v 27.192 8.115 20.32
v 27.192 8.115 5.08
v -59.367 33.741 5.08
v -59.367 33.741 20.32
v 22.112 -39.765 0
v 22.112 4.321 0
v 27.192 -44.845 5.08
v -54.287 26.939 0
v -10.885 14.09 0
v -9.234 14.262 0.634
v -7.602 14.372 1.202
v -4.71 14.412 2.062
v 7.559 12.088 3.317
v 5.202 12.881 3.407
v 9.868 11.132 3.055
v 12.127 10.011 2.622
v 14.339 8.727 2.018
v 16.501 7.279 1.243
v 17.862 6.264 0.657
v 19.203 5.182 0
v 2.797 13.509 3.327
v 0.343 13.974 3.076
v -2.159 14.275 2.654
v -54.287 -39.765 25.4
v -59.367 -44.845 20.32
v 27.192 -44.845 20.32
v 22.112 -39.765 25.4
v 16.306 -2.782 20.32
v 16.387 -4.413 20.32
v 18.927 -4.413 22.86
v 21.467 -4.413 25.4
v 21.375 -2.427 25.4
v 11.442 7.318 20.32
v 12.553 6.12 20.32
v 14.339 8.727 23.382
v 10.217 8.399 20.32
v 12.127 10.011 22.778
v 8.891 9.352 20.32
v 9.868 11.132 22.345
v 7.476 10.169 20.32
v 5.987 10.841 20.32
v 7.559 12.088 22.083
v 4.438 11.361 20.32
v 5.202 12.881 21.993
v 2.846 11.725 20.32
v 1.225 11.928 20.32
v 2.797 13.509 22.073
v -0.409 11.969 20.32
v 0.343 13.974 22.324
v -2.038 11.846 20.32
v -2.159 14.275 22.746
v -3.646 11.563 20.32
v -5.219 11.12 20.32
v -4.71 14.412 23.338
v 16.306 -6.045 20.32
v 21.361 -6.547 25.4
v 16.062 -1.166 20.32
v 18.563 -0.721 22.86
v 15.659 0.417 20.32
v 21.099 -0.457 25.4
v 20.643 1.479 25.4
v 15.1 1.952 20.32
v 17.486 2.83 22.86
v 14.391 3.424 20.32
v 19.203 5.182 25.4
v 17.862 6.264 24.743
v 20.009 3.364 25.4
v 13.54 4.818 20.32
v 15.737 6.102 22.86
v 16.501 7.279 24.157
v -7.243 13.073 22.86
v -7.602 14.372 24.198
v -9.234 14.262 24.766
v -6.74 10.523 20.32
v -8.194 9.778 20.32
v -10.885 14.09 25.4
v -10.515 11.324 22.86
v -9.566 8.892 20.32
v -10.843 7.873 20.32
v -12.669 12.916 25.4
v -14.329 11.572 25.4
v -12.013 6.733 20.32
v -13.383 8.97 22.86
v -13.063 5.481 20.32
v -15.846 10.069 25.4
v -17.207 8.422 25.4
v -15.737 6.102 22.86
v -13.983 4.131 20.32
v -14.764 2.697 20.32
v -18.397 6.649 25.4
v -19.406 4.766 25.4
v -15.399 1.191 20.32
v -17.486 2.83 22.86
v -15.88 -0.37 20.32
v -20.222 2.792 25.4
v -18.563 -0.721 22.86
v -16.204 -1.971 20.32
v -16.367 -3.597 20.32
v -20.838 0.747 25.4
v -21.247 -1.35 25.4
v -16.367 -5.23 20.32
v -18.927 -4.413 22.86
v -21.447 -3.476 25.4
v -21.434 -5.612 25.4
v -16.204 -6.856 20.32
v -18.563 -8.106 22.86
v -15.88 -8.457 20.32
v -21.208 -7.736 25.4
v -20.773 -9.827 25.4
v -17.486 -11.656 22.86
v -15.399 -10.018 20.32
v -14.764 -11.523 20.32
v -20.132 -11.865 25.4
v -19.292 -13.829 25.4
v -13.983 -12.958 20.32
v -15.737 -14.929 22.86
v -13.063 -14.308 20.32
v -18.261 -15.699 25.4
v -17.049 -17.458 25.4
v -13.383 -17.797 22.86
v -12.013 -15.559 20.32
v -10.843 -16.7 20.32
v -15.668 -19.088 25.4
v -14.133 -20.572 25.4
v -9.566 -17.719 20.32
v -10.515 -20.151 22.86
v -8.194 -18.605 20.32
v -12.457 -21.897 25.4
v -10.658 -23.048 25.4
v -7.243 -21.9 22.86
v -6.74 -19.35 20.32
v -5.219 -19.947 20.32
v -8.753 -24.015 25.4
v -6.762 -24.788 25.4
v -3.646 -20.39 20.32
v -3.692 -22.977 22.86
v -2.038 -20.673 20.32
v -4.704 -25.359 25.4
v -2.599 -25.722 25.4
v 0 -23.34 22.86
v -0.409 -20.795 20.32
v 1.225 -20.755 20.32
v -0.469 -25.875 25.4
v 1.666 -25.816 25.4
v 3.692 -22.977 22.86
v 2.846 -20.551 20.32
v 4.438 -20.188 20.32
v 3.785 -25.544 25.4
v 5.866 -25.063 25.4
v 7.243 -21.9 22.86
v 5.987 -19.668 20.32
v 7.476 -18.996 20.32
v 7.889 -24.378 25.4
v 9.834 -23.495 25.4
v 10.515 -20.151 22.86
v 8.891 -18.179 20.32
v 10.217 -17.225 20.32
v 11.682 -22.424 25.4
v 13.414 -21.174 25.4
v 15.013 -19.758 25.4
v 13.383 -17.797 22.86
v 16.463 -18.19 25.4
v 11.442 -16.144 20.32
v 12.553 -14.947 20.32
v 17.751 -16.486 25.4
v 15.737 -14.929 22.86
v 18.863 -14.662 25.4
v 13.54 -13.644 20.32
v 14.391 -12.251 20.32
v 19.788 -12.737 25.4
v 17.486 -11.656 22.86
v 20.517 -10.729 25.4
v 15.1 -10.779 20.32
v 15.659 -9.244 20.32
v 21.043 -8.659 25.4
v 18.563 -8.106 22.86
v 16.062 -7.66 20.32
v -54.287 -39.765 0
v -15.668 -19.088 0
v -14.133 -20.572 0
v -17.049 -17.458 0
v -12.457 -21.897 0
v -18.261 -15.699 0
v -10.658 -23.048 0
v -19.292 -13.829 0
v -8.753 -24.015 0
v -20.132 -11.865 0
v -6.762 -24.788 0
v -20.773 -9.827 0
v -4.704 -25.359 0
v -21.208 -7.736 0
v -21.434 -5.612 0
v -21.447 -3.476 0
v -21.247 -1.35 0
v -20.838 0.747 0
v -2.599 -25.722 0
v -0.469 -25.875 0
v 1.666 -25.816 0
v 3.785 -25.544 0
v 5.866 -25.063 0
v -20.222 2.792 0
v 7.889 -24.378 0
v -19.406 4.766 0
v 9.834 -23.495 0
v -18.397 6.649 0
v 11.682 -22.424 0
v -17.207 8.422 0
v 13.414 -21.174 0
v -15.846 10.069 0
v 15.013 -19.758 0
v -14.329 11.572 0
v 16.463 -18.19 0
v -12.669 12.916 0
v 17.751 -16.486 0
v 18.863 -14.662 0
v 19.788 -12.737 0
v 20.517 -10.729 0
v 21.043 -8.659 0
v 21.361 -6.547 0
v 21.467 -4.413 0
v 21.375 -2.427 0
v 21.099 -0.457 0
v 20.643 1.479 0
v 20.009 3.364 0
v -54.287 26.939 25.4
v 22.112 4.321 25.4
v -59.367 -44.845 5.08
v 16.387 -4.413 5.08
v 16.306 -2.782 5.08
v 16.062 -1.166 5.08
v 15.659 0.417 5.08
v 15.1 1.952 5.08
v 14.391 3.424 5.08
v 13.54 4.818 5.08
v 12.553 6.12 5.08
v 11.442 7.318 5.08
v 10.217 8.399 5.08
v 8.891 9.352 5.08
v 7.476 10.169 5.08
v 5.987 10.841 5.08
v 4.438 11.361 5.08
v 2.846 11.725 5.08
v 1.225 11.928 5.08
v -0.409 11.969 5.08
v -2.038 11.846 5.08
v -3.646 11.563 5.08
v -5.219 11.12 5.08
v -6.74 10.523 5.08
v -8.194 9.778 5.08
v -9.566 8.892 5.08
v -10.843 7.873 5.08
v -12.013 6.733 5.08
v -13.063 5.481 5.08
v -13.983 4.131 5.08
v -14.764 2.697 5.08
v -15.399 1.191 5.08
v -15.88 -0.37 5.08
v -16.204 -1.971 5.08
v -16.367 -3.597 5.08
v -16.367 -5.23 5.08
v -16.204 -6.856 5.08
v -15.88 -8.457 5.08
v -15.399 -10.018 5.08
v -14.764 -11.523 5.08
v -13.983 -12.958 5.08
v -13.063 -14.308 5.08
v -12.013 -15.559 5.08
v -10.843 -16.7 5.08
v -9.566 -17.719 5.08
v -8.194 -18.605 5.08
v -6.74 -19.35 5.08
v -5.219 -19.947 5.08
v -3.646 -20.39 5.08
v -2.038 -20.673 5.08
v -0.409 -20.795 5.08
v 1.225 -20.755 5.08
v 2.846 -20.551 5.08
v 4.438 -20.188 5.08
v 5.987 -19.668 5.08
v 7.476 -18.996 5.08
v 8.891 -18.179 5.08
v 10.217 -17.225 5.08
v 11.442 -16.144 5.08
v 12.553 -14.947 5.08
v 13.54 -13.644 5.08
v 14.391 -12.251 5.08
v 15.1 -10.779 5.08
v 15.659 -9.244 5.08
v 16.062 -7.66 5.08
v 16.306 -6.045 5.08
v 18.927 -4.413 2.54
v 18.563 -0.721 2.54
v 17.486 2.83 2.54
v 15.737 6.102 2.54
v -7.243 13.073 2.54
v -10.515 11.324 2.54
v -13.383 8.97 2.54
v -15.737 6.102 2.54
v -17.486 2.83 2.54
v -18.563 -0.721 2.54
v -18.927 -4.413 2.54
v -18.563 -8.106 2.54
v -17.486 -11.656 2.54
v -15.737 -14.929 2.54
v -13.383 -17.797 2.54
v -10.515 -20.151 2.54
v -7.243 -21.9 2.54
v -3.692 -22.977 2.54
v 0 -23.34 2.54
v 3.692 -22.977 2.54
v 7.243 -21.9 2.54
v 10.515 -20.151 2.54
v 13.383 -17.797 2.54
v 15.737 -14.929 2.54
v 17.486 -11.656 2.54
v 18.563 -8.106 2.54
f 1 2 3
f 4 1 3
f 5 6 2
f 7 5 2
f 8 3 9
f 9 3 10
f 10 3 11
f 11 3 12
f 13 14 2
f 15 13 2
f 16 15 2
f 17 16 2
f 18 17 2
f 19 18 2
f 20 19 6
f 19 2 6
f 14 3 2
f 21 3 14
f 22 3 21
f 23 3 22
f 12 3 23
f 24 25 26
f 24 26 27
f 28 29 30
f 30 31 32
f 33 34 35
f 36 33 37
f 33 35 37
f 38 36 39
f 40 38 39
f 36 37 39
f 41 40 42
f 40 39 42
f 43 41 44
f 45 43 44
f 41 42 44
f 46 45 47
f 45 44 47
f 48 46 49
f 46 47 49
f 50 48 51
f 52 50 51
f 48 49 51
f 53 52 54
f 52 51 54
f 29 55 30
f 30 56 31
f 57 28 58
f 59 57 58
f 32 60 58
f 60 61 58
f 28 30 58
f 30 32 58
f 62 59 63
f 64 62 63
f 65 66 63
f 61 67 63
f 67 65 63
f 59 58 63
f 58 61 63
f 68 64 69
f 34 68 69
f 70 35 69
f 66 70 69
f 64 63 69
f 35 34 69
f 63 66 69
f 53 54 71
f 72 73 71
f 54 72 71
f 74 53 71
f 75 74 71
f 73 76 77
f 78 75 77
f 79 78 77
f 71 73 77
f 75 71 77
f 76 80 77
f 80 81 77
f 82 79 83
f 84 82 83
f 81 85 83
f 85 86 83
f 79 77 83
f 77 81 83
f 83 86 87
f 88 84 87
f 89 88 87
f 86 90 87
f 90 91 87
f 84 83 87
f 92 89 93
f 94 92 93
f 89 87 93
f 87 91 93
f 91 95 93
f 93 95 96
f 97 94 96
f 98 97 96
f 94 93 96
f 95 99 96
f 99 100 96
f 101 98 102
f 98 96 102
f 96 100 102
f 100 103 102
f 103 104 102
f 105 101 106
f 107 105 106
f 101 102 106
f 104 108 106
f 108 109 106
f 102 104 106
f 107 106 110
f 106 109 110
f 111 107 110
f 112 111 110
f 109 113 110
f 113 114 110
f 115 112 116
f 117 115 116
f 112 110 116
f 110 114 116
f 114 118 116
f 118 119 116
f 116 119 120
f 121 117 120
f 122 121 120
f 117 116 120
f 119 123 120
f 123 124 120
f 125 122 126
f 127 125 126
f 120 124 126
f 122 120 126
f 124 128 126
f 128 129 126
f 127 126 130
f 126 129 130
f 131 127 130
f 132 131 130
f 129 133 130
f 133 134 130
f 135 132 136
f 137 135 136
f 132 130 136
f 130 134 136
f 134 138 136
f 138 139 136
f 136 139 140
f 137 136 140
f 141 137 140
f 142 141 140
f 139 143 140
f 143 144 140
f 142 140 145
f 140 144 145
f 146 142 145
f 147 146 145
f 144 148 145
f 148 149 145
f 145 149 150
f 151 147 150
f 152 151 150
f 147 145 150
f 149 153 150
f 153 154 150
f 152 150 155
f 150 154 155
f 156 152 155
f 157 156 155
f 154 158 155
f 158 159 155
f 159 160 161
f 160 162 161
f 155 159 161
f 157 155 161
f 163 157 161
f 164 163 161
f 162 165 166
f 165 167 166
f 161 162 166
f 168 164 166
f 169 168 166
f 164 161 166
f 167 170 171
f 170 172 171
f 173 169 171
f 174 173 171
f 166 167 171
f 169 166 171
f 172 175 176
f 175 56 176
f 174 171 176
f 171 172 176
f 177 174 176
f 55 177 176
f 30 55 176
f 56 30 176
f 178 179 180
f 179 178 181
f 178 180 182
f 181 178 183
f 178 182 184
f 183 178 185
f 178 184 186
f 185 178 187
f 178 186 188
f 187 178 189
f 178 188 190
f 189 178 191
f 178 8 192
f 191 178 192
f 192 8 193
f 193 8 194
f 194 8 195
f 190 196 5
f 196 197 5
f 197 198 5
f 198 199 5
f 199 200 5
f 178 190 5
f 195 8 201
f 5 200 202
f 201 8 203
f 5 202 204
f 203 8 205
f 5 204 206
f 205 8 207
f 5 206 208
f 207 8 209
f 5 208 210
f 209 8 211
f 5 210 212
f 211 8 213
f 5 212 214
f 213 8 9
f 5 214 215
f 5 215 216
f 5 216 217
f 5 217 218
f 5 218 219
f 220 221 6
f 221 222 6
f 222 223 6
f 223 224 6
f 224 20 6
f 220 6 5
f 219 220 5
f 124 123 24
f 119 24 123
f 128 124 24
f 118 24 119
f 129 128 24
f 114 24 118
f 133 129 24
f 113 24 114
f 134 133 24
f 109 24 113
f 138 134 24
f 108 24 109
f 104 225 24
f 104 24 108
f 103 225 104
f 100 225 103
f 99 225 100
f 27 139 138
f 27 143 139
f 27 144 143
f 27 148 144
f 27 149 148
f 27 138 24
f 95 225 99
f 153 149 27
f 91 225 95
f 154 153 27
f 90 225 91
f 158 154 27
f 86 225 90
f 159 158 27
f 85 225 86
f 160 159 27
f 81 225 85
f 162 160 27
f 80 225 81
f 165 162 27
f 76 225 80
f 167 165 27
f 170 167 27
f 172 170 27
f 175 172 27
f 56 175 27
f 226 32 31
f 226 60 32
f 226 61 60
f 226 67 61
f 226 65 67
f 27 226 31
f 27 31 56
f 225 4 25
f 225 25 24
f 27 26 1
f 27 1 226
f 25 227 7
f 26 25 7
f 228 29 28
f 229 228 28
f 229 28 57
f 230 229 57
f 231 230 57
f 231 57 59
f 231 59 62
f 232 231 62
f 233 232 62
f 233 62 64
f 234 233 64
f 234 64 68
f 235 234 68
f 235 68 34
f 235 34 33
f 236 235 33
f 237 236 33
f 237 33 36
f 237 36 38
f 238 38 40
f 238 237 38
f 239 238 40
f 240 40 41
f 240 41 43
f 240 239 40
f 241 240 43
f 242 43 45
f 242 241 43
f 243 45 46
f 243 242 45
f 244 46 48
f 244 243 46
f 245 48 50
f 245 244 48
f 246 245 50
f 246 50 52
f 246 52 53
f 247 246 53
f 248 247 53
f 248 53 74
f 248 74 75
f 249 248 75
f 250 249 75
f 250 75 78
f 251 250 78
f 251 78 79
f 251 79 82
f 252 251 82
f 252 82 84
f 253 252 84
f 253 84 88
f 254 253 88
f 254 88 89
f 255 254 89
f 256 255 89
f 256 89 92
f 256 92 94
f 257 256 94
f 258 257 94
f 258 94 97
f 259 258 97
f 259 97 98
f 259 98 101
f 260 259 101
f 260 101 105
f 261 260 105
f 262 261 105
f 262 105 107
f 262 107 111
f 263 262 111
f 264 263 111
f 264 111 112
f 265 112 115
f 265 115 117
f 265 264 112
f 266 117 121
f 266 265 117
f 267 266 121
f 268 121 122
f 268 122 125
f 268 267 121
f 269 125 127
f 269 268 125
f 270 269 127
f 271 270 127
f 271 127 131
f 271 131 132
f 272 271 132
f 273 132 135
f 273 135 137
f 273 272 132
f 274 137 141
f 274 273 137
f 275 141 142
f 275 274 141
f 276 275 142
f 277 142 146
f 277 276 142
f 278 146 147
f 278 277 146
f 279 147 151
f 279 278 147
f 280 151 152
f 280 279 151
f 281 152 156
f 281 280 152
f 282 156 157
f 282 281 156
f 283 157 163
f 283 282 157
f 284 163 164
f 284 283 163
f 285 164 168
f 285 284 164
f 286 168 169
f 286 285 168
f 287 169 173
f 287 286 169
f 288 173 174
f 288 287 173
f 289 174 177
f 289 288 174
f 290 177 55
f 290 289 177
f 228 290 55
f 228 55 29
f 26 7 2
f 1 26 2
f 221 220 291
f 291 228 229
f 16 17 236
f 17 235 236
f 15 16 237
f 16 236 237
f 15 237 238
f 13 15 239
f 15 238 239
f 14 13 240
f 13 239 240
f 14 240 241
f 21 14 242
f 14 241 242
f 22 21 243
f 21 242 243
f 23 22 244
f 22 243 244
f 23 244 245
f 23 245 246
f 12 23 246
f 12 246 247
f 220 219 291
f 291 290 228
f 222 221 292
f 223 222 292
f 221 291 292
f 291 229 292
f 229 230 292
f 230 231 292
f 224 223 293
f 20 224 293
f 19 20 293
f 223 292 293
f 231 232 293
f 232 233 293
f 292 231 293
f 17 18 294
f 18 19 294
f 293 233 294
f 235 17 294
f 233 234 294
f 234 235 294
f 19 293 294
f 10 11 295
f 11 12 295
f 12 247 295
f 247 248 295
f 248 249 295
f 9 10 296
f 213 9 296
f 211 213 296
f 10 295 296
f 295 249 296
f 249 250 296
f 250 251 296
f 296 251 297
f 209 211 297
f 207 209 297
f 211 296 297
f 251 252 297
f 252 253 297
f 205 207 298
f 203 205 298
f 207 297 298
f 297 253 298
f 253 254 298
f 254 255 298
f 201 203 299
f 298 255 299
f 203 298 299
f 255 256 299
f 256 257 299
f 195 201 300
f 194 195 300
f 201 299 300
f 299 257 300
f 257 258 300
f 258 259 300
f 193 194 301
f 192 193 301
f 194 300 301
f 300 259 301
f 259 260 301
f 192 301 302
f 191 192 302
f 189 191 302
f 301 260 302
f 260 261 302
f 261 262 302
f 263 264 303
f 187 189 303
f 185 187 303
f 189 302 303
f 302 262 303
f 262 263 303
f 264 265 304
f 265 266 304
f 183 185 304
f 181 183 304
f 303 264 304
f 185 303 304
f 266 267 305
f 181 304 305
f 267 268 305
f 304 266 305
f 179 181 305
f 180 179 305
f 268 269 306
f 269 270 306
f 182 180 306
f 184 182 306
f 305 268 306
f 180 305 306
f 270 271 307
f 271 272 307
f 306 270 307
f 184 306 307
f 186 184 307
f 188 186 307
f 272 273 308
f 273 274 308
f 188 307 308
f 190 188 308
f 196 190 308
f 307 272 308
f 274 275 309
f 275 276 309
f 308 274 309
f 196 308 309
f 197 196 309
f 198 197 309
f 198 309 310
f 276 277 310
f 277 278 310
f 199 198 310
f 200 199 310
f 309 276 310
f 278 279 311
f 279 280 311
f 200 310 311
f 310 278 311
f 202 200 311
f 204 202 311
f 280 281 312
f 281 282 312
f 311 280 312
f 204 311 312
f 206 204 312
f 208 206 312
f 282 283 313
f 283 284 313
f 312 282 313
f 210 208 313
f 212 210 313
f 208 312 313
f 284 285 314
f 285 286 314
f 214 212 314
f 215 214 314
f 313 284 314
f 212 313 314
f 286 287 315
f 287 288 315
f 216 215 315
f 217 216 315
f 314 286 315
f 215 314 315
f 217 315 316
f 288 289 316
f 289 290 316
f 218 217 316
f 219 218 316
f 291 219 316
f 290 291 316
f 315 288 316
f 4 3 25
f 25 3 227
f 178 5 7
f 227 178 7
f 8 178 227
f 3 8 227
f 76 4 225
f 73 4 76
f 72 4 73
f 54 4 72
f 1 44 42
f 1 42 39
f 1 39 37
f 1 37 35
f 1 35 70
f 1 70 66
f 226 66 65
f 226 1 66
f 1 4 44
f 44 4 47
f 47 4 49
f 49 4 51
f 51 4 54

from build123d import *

# Parameters (mm, degrees)
F0_R        = 16.3870034363
F1_DEPTH    = 25.4
F2_T1_DEPTH = 116.4008158105
F2_T3_DEPTH = 104.7146316577
F2_T5_DEPTH = 112.6871608157
F2_T7_DEPTH = 79.0886539925
F3_T1_DEPTH = 116.4008158105
F3_T3_DEPTH = 104.7146316577
F3_T5_DEPTH = 112.6871608157
F3_T7_DEPTH = 79.0886539925


# Not quite as in the source:
# - a fillet or chamfer that OpenCascade refuses, or shapes differently, is made with other operations: its cross-section is extruded or revolved along the edge and cut away or added


with BuildPart() as f1:
    # F0 (on Top) → F1 (new body)
    with BuildSketch(Plane.XY):
        Polygon((27.1920096129, 8.1148929894), (-59.3668520451, 33.7408706546), (-59.3668520451, -44.8454618454), (27.1920096129, -44.8454618454), align=None)
        with Locations((0, -4.4133625925)):
            Circle(F0_R, mode=Mode.SUBTRACT)
    extrude(amount=F1_DEPTH)

    # F2: chamfer of 5.08 on 5 edges, made by hand

    # F2_s2 → F2_t1 (cut)
    with BuildSketch(Plane(origin=(35.3186398876, -10.4561758275, 0), x_dir=(0, 0, 1), z_dir=(-0.9588617319, 0.2838735267, 0))):
        Polygon((20.32, 15.5001520123), (25.4, 10.4201520123), (25.4, 15.5001520123), align=None)
    extrude(amount=F2_T1_DEPTH, mode=Mode.SUBTRACT)

    # F2_s4 → F2_t3 (cut)
    with BuildSketch(Plane.XZ.offset(-46.8050202334)):
        Polygon((-59.3668520451, 20.32), (-54.2868520451, 25.4), (-59.3668520451, 25.4), align=None)
    extrude(amount=F2_T3_DEPTH, mode=Mode.SUBTRACT)

    # F2_s6 → F2_t5 (cut)
    with BuildSketch(Plane.YZ.offset(-72.4310016239)):
        Polygon((-44.8454618454, 20.32), (-39.7654618454, 25.4), (-44.8454618454, 25.4), align=None)
    extrude(amount=F2_T5_DEPTH, mode=Mode.SUBTRACT)

    # F2_s8 → F2_t7 (cut)
    with BuildSketch(Plane.XZ.offset(-21.1790425683)):
        Polygon((27.1920096129, 20.32), (22.1120096129, 25.4), (27.1920096129, 25.4), align=None)
    extrude(amount=F2_T7_DEPTH, mode=Mode.SUBTRACT)

    # F2_s9 → F2_t10 (revolve, cut)
    with BuildSketch(Plane.XZ.offset(4.4133625925)):
        Polygon((16.3870034363, 20.32), (21.4670034363, 25.4), (16.3870034363, 25.4), align=None)
    revolve(axis=Axis((0, -4.4133625925, 25.4), (0, 0, 1)), mode=Mode.SUBTRACT)

    # F3: chamfer of 5.08 on 5 edges, made by hand

    # F3_s2 → F3_t1 (cut)
    with BuildSketch(Plane(origin=(35.3186398876, -10.4561758275, 0), x_dir=(0, 0, 1), z_dir=(-0.9588617319, 0.2838735267, 0))):
        Polygon((5.08, 15.5001520123), (0, 10.4201520123), (0, 15.5001520123), align=None)
    extrude(amount=F3_T1_DEPTH, mode=Mode.SUBTRACT)

    # F3_s4 → F3_t3 (cut)
    with BuildSketch(Plane.XZ.offset(-46.8050202334)):
        Polygon((-54.2868520451, 0), (-59.3668520451, 5.08), (-59.3668520451, 0), align=None)
    extrude(amount=F3_T3_DEPTH, mode=Mode.SUBTRACT)

    # F3_s6 → F3_t5 (cut)
    with BuildSketch(Plane.YZ.offset(-72.4310016239)):
        Polygon((-39.7654618454, 0), (-44.8454618454, 5.08), (-44.8454618454, 0), align=None)
    extrude(amount=F3_T5_DEPTH, mode=Mode.SUBTRACT)

    # F3_s8 → F3_t7 (cut)
    with BuildSketch(Plane.XZ.offset(-21.1790425683)):
        Polygon((22.1120096129, 0), (27.1920096129, 5.08), (27.1920096129, 0), align=None)
    extrude(amount=F3_T7_DEPTH, mode=Mode.SUBTRACT)

    # F3_s9 → F3_t10 (revolve, cut)
    with BuildSketch(Plane.XZ.offset(4.4133625925)):
        Polygon((21.4670034363, 0), (16.3870034363, 5.08), (16.3870034363, 0), align=None)
    revolve(axis=Axis((0, -4.4133625925, 0), (0, 0, 1)), mode=Mode.SUBTRACT)


solid = f1.part
